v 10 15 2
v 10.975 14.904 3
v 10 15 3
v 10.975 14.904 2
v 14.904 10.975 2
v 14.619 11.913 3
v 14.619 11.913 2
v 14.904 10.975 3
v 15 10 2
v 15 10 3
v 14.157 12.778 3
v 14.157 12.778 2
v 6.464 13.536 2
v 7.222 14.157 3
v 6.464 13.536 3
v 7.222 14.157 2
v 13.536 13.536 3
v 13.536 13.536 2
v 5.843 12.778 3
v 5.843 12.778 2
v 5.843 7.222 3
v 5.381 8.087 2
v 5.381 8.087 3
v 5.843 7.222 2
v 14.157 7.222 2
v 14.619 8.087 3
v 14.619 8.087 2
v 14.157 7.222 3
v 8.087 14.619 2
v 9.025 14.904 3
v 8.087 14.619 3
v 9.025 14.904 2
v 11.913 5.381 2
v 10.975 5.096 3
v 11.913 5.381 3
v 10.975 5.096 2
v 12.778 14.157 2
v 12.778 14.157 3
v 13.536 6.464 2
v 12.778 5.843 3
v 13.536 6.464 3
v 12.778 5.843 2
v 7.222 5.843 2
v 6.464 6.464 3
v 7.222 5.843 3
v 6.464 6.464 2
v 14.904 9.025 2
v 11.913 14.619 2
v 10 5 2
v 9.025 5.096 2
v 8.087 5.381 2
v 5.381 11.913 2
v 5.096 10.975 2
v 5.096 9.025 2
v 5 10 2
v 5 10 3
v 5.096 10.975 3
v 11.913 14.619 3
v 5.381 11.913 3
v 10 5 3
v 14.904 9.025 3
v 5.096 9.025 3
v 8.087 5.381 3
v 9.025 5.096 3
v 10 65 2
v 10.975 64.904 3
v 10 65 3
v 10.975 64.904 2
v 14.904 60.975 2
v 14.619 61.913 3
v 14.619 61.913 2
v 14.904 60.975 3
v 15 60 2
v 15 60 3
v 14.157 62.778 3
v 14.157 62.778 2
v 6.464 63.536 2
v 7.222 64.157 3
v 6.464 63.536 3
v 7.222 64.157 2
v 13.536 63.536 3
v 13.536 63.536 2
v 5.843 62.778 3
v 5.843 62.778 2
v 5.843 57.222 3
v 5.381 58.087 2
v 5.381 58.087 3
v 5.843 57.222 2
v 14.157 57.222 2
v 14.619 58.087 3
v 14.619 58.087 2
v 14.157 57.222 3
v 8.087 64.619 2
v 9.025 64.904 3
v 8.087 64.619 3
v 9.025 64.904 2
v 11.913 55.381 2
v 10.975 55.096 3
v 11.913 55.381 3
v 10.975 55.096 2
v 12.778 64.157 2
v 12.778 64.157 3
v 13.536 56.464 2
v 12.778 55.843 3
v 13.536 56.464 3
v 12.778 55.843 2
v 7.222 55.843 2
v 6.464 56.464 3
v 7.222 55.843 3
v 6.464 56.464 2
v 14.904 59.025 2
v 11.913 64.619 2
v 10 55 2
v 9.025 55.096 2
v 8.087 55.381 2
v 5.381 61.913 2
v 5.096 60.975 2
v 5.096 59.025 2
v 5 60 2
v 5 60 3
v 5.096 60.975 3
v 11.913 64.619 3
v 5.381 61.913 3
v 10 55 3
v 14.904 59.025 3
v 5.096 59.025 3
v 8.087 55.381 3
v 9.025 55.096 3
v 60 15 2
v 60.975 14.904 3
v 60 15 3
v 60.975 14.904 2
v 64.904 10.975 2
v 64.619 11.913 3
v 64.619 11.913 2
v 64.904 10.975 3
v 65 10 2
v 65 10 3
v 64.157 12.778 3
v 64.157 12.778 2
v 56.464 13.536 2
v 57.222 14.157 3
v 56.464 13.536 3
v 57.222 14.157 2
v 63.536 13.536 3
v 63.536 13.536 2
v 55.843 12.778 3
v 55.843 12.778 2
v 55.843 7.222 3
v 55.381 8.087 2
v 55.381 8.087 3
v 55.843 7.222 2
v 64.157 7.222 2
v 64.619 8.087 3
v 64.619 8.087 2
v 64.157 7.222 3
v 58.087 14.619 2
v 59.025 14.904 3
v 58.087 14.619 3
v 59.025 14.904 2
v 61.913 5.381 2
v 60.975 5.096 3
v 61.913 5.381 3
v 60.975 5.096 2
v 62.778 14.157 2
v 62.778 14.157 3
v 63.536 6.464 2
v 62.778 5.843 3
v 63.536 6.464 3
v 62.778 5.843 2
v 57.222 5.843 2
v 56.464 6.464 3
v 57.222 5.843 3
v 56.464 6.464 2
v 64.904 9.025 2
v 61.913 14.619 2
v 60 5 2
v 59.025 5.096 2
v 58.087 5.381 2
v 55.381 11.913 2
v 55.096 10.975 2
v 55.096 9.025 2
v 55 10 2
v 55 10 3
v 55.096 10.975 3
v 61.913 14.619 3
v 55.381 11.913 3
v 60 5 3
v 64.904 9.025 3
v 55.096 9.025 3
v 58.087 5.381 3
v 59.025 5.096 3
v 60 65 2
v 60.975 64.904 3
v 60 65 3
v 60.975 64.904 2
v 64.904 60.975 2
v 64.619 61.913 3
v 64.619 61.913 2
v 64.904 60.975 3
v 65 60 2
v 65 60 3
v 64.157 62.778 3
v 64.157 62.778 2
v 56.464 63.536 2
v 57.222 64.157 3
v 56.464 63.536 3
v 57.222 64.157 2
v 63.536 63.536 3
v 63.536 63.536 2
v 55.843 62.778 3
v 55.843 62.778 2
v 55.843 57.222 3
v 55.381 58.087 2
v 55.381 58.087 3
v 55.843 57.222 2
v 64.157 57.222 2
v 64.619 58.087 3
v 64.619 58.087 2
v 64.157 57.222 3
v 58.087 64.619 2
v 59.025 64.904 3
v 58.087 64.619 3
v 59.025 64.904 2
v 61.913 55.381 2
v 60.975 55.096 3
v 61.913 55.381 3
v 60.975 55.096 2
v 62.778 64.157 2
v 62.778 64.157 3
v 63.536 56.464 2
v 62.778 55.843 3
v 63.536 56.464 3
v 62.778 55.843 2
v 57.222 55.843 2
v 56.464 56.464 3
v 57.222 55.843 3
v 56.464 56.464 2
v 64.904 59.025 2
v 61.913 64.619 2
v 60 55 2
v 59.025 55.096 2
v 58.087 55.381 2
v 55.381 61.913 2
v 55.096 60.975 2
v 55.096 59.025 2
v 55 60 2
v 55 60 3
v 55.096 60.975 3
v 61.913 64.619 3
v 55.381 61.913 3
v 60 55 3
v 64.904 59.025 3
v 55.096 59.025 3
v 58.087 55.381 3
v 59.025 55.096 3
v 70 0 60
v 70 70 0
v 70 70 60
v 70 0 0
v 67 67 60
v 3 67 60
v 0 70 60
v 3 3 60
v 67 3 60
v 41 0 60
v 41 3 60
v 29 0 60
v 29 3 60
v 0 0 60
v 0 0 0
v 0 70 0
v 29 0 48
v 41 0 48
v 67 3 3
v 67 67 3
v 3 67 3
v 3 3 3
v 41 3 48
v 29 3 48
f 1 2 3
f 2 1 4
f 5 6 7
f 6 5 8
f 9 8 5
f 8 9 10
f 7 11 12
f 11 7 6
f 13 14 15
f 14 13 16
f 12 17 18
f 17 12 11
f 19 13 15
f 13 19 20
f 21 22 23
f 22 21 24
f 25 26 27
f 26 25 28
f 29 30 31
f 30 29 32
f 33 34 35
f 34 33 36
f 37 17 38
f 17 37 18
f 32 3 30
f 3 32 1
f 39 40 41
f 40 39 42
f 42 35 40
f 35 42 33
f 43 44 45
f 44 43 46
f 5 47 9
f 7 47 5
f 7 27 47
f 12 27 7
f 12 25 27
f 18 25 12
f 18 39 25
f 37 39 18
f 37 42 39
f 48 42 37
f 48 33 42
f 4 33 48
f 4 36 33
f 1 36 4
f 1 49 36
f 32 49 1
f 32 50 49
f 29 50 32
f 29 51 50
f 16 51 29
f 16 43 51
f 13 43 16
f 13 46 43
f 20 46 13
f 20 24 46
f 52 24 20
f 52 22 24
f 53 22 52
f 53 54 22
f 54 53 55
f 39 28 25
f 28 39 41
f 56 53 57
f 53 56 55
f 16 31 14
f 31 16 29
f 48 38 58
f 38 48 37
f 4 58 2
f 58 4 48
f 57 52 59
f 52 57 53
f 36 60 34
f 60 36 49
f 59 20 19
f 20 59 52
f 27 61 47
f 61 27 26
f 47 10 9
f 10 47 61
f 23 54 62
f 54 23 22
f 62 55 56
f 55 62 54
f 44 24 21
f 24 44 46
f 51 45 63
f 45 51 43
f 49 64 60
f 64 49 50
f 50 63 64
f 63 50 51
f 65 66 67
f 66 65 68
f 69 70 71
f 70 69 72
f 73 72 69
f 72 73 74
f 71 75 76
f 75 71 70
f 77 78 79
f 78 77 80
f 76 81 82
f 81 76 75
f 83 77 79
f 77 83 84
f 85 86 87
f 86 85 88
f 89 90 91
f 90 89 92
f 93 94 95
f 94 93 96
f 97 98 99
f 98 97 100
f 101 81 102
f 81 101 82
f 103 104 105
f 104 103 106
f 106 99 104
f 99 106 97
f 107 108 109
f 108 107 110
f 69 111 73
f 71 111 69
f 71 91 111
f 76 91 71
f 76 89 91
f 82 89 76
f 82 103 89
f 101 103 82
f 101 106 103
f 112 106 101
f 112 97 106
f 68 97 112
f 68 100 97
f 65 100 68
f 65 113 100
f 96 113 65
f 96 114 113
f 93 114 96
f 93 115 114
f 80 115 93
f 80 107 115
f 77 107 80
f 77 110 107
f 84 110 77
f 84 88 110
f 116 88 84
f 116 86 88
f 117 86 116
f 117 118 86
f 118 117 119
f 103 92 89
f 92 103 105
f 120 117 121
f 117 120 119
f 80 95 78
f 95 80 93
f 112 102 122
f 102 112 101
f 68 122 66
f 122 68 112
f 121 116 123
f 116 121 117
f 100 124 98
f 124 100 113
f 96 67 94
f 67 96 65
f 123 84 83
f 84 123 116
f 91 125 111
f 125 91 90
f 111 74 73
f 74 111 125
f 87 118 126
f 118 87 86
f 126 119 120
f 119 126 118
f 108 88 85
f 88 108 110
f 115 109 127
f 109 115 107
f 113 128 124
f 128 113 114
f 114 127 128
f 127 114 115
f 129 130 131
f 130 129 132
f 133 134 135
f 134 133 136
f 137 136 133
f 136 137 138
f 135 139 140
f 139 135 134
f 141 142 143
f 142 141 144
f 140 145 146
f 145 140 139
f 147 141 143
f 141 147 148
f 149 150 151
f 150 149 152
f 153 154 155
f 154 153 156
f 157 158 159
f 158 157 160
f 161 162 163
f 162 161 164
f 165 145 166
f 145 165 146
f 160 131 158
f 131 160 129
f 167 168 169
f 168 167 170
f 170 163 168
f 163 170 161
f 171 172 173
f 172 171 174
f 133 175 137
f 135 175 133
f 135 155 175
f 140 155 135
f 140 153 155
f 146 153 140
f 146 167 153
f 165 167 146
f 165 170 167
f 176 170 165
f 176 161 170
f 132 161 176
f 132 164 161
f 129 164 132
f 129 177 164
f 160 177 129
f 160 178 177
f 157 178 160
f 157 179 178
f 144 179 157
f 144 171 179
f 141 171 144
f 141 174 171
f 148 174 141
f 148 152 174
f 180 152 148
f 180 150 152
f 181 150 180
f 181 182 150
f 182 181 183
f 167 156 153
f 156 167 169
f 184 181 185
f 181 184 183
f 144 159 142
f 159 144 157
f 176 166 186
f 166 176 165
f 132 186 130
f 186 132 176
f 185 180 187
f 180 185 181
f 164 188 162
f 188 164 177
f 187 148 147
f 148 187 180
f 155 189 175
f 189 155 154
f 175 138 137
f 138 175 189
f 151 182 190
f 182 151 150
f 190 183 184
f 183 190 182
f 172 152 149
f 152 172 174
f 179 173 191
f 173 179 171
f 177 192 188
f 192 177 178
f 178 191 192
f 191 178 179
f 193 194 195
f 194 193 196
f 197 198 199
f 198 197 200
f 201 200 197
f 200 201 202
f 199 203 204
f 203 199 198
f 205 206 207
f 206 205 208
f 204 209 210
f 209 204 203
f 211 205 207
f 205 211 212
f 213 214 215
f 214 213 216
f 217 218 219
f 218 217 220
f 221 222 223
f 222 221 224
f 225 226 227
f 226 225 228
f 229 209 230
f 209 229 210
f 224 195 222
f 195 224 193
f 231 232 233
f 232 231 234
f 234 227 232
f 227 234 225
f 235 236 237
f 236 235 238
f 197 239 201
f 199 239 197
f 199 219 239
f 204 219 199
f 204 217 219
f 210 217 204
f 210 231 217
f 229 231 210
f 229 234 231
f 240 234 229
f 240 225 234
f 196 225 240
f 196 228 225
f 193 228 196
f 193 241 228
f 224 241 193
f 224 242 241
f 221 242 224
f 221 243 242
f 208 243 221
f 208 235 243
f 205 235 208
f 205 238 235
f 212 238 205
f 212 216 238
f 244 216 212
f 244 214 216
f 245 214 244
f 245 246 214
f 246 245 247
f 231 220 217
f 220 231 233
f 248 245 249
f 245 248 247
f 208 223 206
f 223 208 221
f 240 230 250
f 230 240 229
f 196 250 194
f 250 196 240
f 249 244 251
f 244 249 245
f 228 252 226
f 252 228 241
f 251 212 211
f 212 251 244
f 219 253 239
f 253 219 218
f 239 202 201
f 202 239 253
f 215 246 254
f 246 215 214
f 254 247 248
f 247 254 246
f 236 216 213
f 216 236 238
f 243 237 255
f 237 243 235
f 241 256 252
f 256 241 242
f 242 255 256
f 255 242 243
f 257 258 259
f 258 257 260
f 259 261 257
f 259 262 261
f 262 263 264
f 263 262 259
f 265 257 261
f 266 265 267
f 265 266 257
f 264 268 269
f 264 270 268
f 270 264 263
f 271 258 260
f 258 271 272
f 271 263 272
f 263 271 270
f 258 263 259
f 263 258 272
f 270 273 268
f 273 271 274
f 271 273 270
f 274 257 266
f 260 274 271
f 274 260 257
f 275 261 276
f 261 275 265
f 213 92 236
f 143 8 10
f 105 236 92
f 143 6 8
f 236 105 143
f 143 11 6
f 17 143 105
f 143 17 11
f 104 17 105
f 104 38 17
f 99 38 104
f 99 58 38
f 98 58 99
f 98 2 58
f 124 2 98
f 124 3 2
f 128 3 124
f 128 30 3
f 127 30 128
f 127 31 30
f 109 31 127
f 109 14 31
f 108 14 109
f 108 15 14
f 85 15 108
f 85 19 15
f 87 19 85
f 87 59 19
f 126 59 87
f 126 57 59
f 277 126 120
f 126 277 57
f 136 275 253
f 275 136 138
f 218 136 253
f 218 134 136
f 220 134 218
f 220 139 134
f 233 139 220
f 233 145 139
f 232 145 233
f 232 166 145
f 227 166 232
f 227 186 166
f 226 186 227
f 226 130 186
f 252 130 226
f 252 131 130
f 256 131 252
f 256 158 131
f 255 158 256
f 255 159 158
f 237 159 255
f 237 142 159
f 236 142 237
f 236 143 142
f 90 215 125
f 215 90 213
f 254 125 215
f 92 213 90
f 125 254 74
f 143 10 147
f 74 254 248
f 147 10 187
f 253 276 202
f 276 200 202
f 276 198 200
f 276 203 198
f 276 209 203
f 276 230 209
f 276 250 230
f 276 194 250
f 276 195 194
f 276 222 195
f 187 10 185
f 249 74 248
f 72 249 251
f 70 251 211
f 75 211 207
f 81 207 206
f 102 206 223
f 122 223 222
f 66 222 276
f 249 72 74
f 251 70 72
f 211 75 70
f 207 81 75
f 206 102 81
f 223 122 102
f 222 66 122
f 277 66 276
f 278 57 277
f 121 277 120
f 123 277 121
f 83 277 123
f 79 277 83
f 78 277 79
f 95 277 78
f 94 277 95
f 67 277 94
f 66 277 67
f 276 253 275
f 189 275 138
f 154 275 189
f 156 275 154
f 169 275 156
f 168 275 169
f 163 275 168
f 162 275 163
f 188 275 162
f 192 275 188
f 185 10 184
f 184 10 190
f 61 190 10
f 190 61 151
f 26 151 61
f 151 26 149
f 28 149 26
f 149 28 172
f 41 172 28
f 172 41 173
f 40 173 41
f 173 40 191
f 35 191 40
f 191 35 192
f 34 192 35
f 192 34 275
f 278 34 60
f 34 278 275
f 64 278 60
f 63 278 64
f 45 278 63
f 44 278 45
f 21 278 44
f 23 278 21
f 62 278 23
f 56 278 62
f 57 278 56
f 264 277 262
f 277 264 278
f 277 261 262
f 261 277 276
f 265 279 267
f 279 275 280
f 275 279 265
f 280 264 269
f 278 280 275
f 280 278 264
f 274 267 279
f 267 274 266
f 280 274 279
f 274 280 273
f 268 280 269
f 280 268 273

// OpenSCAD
$fn = 32;

// ----------------------------------------------------------------------
// Enclosure box: both enclosure
// ----------------------------------------------------------------------

// --- parameters (mm) ---
box_l = 70;               // outer length, X
box_w = 70;               // outer width, Y
box_h = 60;               // outer height
wall_t = 3;               // wall thickness
boss_r = 5;               // corner boss radius
hole_r = 1.5;             // boss screw hole radius
boss_in = 10;             // boss inset from the corners
notch_w = 12;             // cable notch width
notch_h = 12;             // cable notch height
fit_tol = 0.1;            // tolerance for press fits, mm
free_tol = 0.5;           // tolerance for clearance fits, mm

inner_h = box_h - wall_t;  // cavity depth
boss_h = inner_h - 2;  // corner boss height

difference() {
  cube([box_l, box_w, box_h]);
  translate([wall_t, wall_t, wall_t])
    cube([box_l - 2 * wall_t, box_w - 2 * wall_t, box_h]);
  for (sx = [0, 1], sy = [0, 1])
    translate([sx ? box_l - boss_in : boss_in,
               sy ? box_w - boss_in : boss_in, wall_t - 1]) {
      cylinder(r = boss_r, h = boss_h);
      translate([0, 0, boss_h - 4])
        cylinder(r = hole_r, h = 5);
    }
  translate([box_l / 2 - notch_w / 2, -1, box_h - notch_h])
    cube([notch_w, wall_t + 2, notch_h + 1]);
}
